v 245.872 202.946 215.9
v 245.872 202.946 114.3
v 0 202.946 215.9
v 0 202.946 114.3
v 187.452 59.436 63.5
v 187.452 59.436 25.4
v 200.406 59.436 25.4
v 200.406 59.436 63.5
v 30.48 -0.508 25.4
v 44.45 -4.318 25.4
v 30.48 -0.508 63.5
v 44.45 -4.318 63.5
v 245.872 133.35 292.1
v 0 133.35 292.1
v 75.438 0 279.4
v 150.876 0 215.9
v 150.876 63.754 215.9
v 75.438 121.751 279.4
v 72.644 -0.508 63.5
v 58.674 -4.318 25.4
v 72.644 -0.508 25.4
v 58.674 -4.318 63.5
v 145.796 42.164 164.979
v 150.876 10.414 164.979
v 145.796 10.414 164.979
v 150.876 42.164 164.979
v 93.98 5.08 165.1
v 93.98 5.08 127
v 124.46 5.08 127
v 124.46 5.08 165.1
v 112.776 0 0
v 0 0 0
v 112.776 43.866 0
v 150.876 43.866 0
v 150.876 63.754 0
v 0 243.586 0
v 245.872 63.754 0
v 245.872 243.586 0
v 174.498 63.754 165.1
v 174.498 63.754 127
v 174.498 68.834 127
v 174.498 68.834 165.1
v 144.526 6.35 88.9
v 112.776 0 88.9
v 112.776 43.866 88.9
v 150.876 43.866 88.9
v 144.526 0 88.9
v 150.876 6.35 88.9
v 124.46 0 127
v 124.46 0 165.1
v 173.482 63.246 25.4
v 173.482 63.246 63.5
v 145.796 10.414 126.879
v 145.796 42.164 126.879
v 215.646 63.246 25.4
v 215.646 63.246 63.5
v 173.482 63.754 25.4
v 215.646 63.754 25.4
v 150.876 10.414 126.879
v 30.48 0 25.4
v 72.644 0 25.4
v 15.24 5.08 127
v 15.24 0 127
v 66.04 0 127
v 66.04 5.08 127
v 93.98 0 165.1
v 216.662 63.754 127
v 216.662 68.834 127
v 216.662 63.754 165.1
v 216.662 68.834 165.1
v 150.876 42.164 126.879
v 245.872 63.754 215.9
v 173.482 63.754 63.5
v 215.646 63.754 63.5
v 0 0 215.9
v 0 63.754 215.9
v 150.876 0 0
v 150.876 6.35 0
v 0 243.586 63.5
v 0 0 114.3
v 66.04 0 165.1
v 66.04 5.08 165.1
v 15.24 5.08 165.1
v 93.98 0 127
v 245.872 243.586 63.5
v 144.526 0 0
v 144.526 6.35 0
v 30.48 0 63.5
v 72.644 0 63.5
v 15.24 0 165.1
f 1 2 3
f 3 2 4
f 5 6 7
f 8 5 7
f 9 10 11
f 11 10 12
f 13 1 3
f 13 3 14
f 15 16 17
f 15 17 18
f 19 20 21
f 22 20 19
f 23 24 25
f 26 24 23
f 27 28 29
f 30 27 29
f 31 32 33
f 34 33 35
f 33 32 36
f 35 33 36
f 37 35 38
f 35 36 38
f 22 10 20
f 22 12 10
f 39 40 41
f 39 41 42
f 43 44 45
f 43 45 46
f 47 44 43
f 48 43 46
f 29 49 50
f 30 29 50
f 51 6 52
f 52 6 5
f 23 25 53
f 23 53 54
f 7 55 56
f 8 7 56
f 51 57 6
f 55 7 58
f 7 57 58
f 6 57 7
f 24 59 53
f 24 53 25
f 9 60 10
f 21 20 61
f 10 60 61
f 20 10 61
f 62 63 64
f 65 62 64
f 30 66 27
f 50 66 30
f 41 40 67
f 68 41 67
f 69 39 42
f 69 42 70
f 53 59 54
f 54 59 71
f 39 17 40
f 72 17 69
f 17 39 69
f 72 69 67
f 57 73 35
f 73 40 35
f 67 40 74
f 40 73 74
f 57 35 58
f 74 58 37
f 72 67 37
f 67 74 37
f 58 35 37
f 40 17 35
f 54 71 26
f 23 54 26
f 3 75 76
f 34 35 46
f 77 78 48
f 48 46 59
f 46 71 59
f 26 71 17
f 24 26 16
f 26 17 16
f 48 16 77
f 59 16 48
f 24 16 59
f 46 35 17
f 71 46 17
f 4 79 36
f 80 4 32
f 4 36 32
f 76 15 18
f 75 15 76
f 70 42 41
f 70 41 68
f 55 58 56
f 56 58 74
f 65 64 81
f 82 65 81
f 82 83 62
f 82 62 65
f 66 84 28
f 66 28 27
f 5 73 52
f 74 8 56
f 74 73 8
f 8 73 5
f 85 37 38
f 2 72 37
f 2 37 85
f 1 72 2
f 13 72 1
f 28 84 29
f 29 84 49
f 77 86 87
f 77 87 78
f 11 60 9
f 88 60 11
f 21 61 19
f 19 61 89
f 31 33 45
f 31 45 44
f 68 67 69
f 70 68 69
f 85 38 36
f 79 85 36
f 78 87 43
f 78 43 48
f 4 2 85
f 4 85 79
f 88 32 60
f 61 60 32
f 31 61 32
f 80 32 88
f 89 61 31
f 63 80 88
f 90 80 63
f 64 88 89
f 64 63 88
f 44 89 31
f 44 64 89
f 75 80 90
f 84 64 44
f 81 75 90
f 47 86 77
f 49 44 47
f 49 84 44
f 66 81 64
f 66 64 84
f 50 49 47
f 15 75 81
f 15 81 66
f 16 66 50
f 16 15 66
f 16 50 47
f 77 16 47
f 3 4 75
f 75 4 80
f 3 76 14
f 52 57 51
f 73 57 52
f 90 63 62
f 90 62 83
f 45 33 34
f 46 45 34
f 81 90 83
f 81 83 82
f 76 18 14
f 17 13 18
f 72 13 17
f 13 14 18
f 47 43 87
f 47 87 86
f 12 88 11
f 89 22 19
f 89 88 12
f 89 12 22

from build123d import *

# Parameters (mm, degrees)
F0_W      = 3.81
F0_H      = 6.35
F0_W_2    = 91.186
F0_H_2    = 125.476
F0_H_3    = 35.306
F0_W_3    = 52.324
F0_W_4    = 82.042
F0_W_5    = 85.852
F0_H_4    = 42.418
F0_H_5    = 143.002
F0_H_6    = 3.81
F1_DEPTH  = 114.3
F2_SIZE2  = 40.64
F2_SIZE   = 50.8
F4_DEPTH  = 101.6
F6_DEPTH  = 245.872
F8_DEPTH  = 133.35
F9_W      = 38.1
F9_H      = 43.866105608
F10_DEPTH = 88.9
F11_W     = 6.35
F11_H     = 6.35
F12_DEPTH = 88.9
F13_W     = 42.164
F13_H     = 38.1
F14_DEPTH = 4.318
F15_SIZE2 = 3.81
F15_SIZE  = 15.24
F16_SIZE2 = 13.97
F16_SIZE  = 3.81
F17_DEPTH = 5.08
F18_W     = 42.164
F18_H     = 38.1
F19_DEPTH = 4.318
F20_SIZE2 = 13.97
F20_SIZE  = 3.81
F21_SIZE2 = 13.97
F21_SIZE  = 3.81
F18_W_2   = 50.8
F22_DEPTH = 5.08
F18_W_3   = 30.48
F23_DEPTH = 5.08
F24_W     = 31.75
F24_H     = 38.1
F25_DEPTH = 5.08


with BuildPart() as f1:
    # F0 (on Top) → F1 (new body)
    with BuildSketch(Plane.XY):
        Polygon((150.876, 63.754), (245.872, 63.754), (245.872, 243.586), (0, 243.586), (0, 0), (150.876, 0), align=None)
        Polygon((6.35, 201.93), (6.35, 237.236), (88.392, 237.236), (92.202, 237.236), (144.526, 237.236), (148.336, 237.236), (239.522, 237.236), (239.522, 201.93), (239.522, 195.58), (239.522, 70.104), (148.336, 70.104), (144.526, 70.104), (144.526, 6.35), (96.012, 6.35), (92.202, 6.35), (6.35, 6.35), (6.35, 149.352), (6.35, 153.162), (6.35, 195.58), align=None, mode=Mode.SUBTRACT)
        with Locations((146.431, 198.755)):
            Rectangle(F0_W, F0_H)
        with Locations((193.929, 132.842)):
            Rectangle(F0_W_2, F0_H_2)
        with Locations((193.929, 219.583)):
            Rectangle(F0_W_2, F0_H_3)
        with Locations((118.364, 219.583)):
            Rectangle(F0_W_3, F0_H_3)
        with Locations((47.371, 219.583)):
            Rectangle(F0_W_4, F0_H_3)
        with Locations((49.276, 174.371)):
            Rectangle(F0_W_5, F0_H_4)
        Polygon((144.526, 195.58), (96.012, 195.58), (96.012, 6.35), (144.526, 6.35), (144.526, 70.104), align=None)
        with Locations((146.431, 132.842)):
            Rectangle(F0_W, F0_H_2)
        with Locations((49.276, 77.851)):
            Rectangle(F0_W_5, F0_H_5)
        Polygon((96.012, 195.58), (92.202, 195.58), (92.202, 153.162), (92.202, 149.352), (92.202, 6.35), (96.012, 6.35), align=None)
        with Locations((49.276, 151.257)):
            Rectangle(F0_W_5, F0_H_6)
        with Locations((193.929, 198.755)):
            Rectangle(F0_W_2, F0_H)
        Polygon((88.392, 201.93), (6.35, 201.93), (6.35, 195.58), (92.202, 195.58), (96.012, 195.58), (144.526, 195.58), (144.526, 201.93), (92.202, 201.93), align=None)
        with Locations((146.431, 219.583)):
            Rectangle(F0_W, F0_H_3)
        with Locations((90.297, 219.583)):
            Rectangle(F0_W, F0_H_3)
    extrude(amount=F1_DEPTH)

    # F2
    f2_edges = [f1.edges().sort_by_distance(p)[0] for p in [
        (122.936, 243.586, 114.3),
    ]]
    f2_side = f1.faces().sort_by_distance((122.936, 243.586, 57.15))[0]
    chamfer(f2_edges, length=F2_SIZE, length2=F2_SIZE2, reference=f2_side)

    # F3 (on face) → F4 (join)
    with BuildSketch(Plane.XY.offset(114.3)):
        Polygon((5.8203e-06, 0), (150.876, 0), (150.876, 63.754), (245.872, 63.754), (245.872, 202.946), (5.8203e-06, 202.946), align=None)
    extrude(amount=F4_DEPTH)

    # F5 (on face) → F6 (join, through all)
    with BuildSketch(Plane.YZ.offset(245.872)):
        Polygon((133.35, 292.1), (63.754, 215.9), (202.946, 215.9), align=None)
    extrude(amount=-F6_DEPTH)

    # F7 (on face) → F8 (join, through all)
    with BuildSketch(Plane.XZ):
        Polygon((75.438, 279.4), (0, 215.9), (150.876, 215.9), align=None)
    extrude(amount=-F8_DEPTH)

    # F9 (on face) → F10 (cut)
    with BuildSketch(Plane(origin=(0, 0, 0), x_dir=(1, 0, 0), z_dir=(0, 0, -1))):
        with Locations((131.826, -21.933052804)):
            Rectangle(F9_W, F9_H)
    extrude(amount=-F10_DEPTH, mode=Mode.SUBTRACT)

    # F11 (on face) → F12 (join, through all)
    with BuildSketch(Plane(origin=(0, 0, 88.9), x_dir=(1, 0, 0), z_dir=(0, 0, -1))):
        with Locations((147.701, -3.175)):
            Rectangle(F11_W, F11_H)
    extrude(amount=F12_DEPTH)

    # F13 (on face) → F14 (join)
    with BuildSketch(Plane.XZ.offset(-63.754)):
        with Locations((194.564, 44.45)):
            Rectangle(F13_W, F13_H)
    extrude(amount=F14_DEPTH)

    # F15
    f15_edges = [f1.edges().sort_by_distance(p)[0] for p in [
        (215.646, 59.436, 44.45),
    ]]
    f15_side = f1.faces().sort_by_distance((194.564, 59.436, 44.45))[0]
    chamfer(f15_edges, length=F15_SIZE, length2=F15_SIZE2, reference=f15_side)

    # F16
    f16_edges = [f1.edges().sort_by_distance(p)[0] for p in [
        (173.482, 59.436, 44.45),
    ]]
    f16_side = f1.faces().sort_by_distance((173.482, 61.595, 44.45))[0]
    chamfer(f16_edges, length=F16_SIZE, length2=F16_SIZE2, reference=f16_side)

    # F13 (on face) → F17 (cut)
    with BuildSketch(Plane.XZ.offset(-63.754)):
        with Locations((195.58, 146.05)):
            Rectangle(F13_W, F13_H)
    extrude(amount=-F17_DEPTH, mode=Mode.SUBTRACT)

    # F18 (on face) → F19 (join)
    with BuildSketch(Plane.XZ):
        with Locations((51.562, 44.45)):
            Rectangle(F18_W, F18_H)
    extrude(amount=F19_DEPTH)

    # F20
    f20_edges = [f1.edges().sort_by_distance(p)[0] for p in [
        (72.644, -4.318, 44.45),
    ]]
    f20_side = f1.faces().sort_by_distance((72.644, -2.159, 44.45))[0]
    chamfer(f20_edges, length=F20_SIZE, length2=F20_SIZE2, reference=f20_side)

    # F21
    f21_edges = [f1.edges().sort_by_distance(p)[0] for p in [
        (30.48, -4.318, 44.45),
    ]]
    f21_side = f1.faces().sort_by_distance((30.48, -2.159, 44.45))[0]
    chamfer(f21_edges, length=F21_SIZE, length2=F21_SIZE2, reference=f21_side)

    # F18 (on face) → F22 (cut)
    with BuildSketch(Plane.XZ):
        with Locations((40.64, 146.05)):
            Rectangle(F18_W_2, F18_H)
    extrude(amount=-F22_DEPTH, mode=Mode.SUBTRACT)

    # F18 (on face) → F23 (cut)
    with BuildSketch(Plane.XZ):
        with Locations((109.22, 146.05)):
            Rectangle(F18_W_3, F18_H)
    extrude(amount=-F23_DEPTH, mode=Mode.SUBTRACT)

    # F24 (on face) → F25 (cut)
    with BuildSketch(Plane.YZ.offset(150.876)):
        with Locations((26.289, 145.9290999826)):
            Rectangle(F24_W, F24_H)
    extrude(amount=-F25_DEPTH, mode=Mode.SUBTRACT)


solid = f1.part
